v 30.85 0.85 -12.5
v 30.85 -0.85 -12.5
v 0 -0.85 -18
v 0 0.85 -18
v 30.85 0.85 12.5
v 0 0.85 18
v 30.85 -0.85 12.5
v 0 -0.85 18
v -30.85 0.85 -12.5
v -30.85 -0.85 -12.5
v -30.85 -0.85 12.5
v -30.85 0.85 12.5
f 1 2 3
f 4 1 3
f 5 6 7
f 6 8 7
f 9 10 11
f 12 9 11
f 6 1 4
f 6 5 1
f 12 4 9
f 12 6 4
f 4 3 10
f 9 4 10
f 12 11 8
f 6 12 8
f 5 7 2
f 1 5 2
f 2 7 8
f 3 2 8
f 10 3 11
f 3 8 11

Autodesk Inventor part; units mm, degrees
ref_plane "YZ Plane" through (0, 0, 0) normal (1, 0, 0) x (0, 1, 0)
ref_plane "XZ Plane" through (0, 0, 0) normal (0, 1, 0) x (-1, 0, 0)
ref_plane "XY Plane" through (0, 0, 0) normal (0, 0, 1) x (1, 0, 0)
sketch "Sketch1" plane through (0, 0, 0) normal (0, 1, 0) x (-1, 0, 0)
  line L0 (30.85, -12.5) -> (30.85, 12.5)
  line L1 (30.85, 12.5) -> (0, 18)
  line L2 (0, 18) -> (-30.85, 12.5)
  line L3 (-30.85, 12.5) -> (-30.85, -12.5)
  line L4 (-30.85, -12.5) -> (0, -18)
  line L5 (0, -18) -> (30.85, -12.5)
  point P0 (0, 0)
  point P1 (30.85, 0)
  point P2 (-30.85, 0)
  dimension "d0" = 61.7
  dimension "d1" = 25
  dimension "d2" = 36
extrude "Extrusion1" add sketch "Sketch1" along normal mid plane 1.7
properties part number "Speaker" material "Paper"
